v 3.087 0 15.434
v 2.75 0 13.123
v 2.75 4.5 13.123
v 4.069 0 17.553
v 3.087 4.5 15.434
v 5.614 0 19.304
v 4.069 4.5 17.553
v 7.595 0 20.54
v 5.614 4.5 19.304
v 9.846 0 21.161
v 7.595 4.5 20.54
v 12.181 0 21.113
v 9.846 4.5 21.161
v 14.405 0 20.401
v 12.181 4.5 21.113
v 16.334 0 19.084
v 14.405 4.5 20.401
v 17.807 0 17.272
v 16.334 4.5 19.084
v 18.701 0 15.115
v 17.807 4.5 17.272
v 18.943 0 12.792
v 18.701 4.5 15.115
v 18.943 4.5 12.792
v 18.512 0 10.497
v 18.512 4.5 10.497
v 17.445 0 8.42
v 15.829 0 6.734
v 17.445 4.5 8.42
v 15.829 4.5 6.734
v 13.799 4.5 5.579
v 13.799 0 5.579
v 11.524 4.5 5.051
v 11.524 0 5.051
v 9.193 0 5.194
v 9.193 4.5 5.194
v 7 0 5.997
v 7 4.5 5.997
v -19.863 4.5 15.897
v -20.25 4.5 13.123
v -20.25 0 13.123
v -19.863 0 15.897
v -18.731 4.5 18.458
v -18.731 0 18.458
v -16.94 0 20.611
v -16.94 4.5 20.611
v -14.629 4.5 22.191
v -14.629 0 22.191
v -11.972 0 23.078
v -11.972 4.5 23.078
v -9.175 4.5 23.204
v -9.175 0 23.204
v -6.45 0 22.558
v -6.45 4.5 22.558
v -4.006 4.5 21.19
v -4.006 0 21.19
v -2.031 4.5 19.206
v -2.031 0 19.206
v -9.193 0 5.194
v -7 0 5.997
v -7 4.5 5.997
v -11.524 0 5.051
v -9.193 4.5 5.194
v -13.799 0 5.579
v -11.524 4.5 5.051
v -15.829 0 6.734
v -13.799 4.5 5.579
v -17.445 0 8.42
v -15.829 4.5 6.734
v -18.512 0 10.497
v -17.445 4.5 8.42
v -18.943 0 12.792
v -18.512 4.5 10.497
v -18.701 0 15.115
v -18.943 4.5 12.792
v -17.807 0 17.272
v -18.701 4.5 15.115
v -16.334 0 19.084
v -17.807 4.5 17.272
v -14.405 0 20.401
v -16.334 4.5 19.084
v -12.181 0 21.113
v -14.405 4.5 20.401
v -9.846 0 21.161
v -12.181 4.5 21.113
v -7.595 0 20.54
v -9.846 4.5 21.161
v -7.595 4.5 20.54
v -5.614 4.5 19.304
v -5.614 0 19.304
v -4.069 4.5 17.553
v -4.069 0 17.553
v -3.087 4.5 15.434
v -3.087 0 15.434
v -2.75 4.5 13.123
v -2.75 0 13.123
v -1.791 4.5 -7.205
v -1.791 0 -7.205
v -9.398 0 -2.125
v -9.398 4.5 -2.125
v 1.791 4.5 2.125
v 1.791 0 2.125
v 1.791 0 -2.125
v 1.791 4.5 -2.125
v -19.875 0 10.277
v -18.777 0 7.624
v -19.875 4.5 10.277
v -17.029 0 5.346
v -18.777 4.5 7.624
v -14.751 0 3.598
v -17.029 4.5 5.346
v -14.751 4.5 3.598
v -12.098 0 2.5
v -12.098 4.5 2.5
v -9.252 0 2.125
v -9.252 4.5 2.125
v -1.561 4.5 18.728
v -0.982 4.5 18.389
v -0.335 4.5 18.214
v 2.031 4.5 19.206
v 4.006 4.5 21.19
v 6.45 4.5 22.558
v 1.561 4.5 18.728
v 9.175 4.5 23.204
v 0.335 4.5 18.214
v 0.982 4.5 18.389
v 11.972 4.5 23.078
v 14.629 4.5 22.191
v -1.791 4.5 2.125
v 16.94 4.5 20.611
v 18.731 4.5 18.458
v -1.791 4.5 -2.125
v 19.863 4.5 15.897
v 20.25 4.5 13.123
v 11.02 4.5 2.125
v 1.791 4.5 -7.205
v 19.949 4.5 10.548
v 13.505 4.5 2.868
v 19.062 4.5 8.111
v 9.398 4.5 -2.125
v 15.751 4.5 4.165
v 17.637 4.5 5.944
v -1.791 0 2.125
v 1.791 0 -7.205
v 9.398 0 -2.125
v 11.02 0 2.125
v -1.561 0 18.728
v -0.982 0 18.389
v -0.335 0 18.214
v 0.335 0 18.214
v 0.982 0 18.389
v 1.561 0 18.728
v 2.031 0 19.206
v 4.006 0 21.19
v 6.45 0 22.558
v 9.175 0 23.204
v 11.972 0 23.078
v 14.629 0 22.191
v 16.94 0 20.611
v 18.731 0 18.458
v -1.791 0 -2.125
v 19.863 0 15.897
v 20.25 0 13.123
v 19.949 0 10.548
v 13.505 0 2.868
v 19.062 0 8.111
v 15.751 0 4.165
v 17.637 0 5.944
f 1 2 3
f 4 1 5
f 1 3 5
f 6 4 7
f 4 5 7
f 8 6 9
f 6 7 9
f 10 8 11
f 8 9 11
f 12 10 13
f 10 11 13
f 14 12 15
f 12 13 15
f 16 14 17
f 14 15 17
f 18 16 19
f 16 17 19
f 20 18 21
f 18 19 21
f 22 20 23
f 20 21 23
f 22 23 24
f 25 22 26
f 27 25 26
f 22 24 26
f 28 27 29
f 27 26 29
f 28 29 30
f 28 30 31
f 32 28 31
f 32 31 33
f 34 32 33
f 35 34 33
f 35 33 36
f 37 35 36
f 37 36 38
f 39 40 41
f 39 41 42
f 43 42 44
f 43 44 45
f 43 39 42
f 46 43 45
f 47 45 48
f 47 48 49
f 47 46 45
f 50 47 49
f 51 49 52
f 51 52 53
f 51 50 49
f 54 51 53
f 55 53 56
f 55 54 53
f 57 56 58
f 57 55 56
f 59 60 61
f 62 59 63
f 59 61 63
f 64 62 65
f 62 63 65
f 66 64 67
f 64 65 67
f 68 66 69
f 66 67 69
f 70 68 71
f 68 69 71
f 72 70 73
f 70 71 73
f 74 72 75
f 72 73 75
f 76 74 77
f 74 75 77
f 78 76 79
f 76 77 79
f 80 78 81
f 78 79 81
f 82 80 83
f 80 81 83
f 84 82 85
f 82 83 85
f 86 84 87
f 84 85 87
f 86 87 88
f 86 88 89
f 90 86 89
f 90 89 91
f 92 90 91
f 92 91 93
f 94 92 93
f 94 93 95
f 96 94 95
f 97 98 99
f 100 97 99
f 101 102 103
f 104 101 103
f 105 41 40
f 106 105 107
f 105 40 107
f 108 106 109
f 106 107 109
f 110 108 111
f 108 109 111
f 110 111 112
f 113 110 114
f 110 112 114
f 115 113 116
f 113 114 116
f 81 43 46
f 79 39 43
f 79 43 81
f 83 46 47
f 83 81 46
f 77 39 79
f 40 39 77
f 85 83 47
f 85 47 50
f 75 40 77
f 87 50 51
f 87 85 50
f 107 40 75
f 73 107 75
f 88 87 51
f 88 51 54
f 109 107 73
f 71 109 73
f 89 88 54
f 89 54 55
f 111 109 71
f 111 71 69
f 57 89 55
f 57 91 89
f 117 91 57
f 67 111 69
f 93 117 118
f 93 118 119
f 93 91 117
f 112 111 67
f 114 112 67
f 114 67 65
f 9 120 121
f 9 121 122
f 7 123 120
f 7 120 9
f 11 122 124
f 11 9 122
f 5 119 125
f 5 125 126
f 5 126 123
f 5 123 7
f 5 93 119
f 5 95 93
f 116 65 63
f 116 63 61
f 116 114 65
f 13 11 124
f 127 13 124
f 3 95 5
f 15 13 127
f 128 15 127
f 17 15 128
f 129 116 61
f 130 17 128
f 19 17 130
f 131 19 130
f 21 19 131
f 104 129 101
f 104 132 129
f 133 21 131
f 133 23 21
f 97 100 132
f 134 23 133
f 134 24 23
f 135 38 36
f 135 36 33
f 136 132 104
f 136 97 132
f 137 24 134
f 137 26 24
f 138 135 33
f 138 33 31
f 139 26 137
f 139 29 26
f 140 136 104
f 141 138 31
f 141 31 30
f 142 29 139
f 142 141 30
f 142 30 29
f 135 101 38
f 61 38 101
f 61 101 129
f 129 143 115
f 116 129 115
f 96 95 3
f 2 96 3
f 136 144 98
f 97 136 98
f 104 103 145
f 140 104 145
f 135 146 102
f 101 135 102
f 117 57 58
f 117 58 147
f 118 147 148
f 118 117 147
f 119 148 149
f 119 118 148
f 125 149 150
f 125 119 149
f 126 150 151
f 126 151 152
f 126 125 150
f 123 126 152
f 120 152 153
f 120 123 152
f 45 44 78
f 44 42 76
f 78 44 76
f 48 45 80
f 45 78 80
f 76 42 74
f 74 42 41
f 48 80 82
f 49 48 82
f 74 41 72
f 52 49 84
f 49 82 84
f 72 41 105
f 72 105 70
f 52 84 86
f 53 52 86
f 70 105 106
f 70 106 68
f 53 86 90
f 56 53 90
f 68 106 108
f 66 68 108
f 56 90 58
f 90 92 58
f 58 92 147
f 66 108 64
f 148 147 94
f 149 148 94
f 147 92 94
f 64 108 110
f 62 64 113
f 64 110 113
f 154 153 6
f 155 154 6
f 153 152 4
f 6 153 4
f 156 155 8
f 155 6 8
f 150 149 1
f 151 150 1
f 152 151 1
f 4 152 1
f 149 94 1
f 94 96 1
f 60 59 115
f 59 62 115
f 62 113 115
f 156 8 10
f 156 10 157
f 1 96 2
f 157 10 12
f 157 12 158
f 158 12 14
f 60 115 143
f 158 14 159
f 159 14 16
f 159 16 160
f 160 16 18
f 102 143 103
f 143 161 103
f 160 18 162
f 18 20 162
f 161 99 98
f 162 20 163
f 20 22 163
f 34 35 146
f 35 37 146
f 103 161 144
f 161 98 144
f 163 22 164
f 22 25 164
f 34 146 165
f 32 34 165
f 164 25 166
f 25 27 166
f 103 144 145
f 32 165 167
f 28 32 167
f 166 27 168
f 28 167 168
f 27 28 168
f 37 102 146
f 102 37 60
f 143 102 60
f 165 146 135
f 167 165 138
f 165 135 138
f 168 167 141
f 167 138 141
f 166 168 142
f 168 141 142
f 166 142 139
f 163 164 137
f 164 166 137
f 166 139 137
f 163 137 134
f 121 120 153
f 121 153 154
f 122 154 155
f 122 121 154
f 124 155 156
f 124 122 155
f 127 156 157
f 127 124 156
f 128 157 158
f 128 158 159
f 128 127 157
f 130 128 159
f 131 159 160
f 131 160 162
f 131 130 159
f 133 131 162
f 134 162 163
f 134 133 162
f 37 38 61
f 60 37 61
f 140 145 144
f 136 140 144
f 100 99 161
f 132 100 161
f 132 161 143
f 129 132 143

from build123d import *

# Parameters (mm, degrees)
BOSS_EXTRUDE1_DEPTH = 4.5
BOSS_EXTRUDE2_DEPTH = 4.5
SKETCH4_R           = 8.1
CUT_EXTRUDE2_DEPTH  = 32.157524023
CUT_EXTRUDE4_REACH  = 33.158
CUT_EXTRUDE5_REACH  = 33.158


with BuildPart() as part:
    # Sketch1 → Boss-Extrude1 (new body)
    with BuildSketch(Plane(origin=(0, 0, 0), x_dir=(1, 0, 0), z_dir=(0, 1, 0))):
        Polygon((-20.25, -13.1232), (20.25, -13.1232), (20.25, -2.125), (1.7907, -2.125), (1.7907, 2.125), (9.398, 2.125), (1.7907, 7.205), (-1.7907, 7.205), (-9.398, 2.125), (-1.7907, 2.125), (-1.7907, -2.125), (-20.25, -2.125), align=None)
    extrude(amount=BOSS_EXTRUDE1_DEPTH)

    # Sketch3 → Boss-Extrude2 (add)
    with BuildSketch(Plane(origin=(0, 4.5, 0), x_dir=(1, 0, 0), z_dir=(0, 1, 0))):
        Polygon((-20.25, -2.125), (-20.25, -13.1232), (20.25, -13.1232), (20.25, -2.125), (1.7907, -2.125), (1.7907, 2.125), (9.398, 2.125), (1.7907, 7.205), (-1.7907, 7.205), (-9.398, 2.125), (-1.7907, 2.125), (-1.7907, -2.125), align=None)
        with BuildLine():
            Line((20.25, -13.1232), (-20.25, -13.1232))
            ThreePointArc((-20.25, -13.1232), (-13.331227209, -22.72714357), (-2.030596131, -19.205654357))
            ThreePointArc((-2.030596131, -19.205654357), (0, -18.191524388), (2.030596131, -19.205654357))
            ThreePointArc((2.030596131, -19.205654357), (13.331227209, -22.72714357), (20.25, -13.1232))
        make_face()
    extrude(amount=-BOSS_EXTRUDE2_DEPTH)

    # Sketch4 → Cut-Extrude2 (cut, through all)
    with BuildSketch(Plane(origin=(0, 4.5, 0), x_dir=(1, 0, 0), z_dir=(0, 1, 0))):
        with Locations(Location((-10.85, -13.1232, 0), (0, 0, 270))):
            Circle(SKETCH4_R)
        with Locations(Location((10.85, -13.1232, 0), (0, 0, 270))):
            Circle(SKETCH4_R)
    extrude(amount=-CUT_EXTRUDE2_DEPTH, mode=Mode.SUBTRACT)

    # Sketch5 → Cut-Extrude4 (cut, up to next)
    with BuildSketch(Plane(origin=(0, 4.5, 0), x_dir=(1, 0, 0), z_dir=(0, 1, 0)), mode=Mode.PRIVATE) as cut_extrude4_sk1:
        with BuildLine():
            Line((7, -5.996665078), (-7, -5.996665078))
            ThreePointArc((-7, -5.996665078), (-3.893168825, -8.974404994), (-2.75, -13.1232))
            Line((-2.75, -13.1232), (2.75, -13.1232))
            ThreePointArc((2.75, -13.1232), (3.893168825, -8.974404994), (7, -5.996665078))
        make_face()
    cut_extrude4_tool1 = extrude(cut_extrude4_sk1.sketch, amount=-CUT_EXTRUDE4_REACH, mode=Mode.PRIVATE) & part.part
    add(cut_extrude4_tool1.solids().sort_by_distance((0, 4.5, 8.978273))[0], mode=Mode.SUBTRACT)

    # Sketch6 → Cut-Extrude5 (cut, up to next)
    with BuildSketch(Plane(origin=(0, 4.5, 0), x_dir=(1, 0, 0), z_dir=(0, 1, 0)), mode=Mode.PRIVATE) as cut_extrude5_sk1:
        with BuildLine():
            Line((-9.2518, -2.125), (-20.25, -2.125))
            Line((-20.25, -2.125), (-20.25, -13.1232))
            ThreePointArc((-20.25, -13.1232), (-17.028701801, -5.346298199), (-9.2518, -2.125))
        make_face()
    cut_extrude5_tool1 = extrude(cut_extrude5_sk1.sketch, amount=-CUT_EXTRUDE5_REACH, mode=Mode.PRIVATE) & part.part
    # Sketch6 → Cut-Extrude5 (cut, up to next)
    with BuildSketch(Plane(origin=(0, 4.5, 0), x_dir=(1, 0, 0), z_dir=(0, 1, 0)), mode=Mode.PRIVATE) as cut_extrude5_sk2:
        with BuildLine():
            Line((20.25, -13.1232), (20.25, -2.125))
            Line((20.25, -2.125), (11.02035, -2.125))
            ThreePointArc((11.02035, -2.125), (17.636860555, -5.94429266), (20.25, -13.1232))
        make_face()
    cut_extrude5_tool2 = extrude(cut_extrude5_sk2.sketch, amount=-CUT_EXTRUDE5_REACH, mode=Mode.PRIVATE) & part.part
    add(cut_extrude5_tool1.solids().sort_by_distance((-17.793355, 4.5, 4.581645))[0], mode=Mode.SUBTRACT)
    add(cut_extrude5_tool2.solids().sort_by_distance((17.919058, 4.5, 4.610875))[0], mode=Mode.SUBTRACT)


solid = part.part
